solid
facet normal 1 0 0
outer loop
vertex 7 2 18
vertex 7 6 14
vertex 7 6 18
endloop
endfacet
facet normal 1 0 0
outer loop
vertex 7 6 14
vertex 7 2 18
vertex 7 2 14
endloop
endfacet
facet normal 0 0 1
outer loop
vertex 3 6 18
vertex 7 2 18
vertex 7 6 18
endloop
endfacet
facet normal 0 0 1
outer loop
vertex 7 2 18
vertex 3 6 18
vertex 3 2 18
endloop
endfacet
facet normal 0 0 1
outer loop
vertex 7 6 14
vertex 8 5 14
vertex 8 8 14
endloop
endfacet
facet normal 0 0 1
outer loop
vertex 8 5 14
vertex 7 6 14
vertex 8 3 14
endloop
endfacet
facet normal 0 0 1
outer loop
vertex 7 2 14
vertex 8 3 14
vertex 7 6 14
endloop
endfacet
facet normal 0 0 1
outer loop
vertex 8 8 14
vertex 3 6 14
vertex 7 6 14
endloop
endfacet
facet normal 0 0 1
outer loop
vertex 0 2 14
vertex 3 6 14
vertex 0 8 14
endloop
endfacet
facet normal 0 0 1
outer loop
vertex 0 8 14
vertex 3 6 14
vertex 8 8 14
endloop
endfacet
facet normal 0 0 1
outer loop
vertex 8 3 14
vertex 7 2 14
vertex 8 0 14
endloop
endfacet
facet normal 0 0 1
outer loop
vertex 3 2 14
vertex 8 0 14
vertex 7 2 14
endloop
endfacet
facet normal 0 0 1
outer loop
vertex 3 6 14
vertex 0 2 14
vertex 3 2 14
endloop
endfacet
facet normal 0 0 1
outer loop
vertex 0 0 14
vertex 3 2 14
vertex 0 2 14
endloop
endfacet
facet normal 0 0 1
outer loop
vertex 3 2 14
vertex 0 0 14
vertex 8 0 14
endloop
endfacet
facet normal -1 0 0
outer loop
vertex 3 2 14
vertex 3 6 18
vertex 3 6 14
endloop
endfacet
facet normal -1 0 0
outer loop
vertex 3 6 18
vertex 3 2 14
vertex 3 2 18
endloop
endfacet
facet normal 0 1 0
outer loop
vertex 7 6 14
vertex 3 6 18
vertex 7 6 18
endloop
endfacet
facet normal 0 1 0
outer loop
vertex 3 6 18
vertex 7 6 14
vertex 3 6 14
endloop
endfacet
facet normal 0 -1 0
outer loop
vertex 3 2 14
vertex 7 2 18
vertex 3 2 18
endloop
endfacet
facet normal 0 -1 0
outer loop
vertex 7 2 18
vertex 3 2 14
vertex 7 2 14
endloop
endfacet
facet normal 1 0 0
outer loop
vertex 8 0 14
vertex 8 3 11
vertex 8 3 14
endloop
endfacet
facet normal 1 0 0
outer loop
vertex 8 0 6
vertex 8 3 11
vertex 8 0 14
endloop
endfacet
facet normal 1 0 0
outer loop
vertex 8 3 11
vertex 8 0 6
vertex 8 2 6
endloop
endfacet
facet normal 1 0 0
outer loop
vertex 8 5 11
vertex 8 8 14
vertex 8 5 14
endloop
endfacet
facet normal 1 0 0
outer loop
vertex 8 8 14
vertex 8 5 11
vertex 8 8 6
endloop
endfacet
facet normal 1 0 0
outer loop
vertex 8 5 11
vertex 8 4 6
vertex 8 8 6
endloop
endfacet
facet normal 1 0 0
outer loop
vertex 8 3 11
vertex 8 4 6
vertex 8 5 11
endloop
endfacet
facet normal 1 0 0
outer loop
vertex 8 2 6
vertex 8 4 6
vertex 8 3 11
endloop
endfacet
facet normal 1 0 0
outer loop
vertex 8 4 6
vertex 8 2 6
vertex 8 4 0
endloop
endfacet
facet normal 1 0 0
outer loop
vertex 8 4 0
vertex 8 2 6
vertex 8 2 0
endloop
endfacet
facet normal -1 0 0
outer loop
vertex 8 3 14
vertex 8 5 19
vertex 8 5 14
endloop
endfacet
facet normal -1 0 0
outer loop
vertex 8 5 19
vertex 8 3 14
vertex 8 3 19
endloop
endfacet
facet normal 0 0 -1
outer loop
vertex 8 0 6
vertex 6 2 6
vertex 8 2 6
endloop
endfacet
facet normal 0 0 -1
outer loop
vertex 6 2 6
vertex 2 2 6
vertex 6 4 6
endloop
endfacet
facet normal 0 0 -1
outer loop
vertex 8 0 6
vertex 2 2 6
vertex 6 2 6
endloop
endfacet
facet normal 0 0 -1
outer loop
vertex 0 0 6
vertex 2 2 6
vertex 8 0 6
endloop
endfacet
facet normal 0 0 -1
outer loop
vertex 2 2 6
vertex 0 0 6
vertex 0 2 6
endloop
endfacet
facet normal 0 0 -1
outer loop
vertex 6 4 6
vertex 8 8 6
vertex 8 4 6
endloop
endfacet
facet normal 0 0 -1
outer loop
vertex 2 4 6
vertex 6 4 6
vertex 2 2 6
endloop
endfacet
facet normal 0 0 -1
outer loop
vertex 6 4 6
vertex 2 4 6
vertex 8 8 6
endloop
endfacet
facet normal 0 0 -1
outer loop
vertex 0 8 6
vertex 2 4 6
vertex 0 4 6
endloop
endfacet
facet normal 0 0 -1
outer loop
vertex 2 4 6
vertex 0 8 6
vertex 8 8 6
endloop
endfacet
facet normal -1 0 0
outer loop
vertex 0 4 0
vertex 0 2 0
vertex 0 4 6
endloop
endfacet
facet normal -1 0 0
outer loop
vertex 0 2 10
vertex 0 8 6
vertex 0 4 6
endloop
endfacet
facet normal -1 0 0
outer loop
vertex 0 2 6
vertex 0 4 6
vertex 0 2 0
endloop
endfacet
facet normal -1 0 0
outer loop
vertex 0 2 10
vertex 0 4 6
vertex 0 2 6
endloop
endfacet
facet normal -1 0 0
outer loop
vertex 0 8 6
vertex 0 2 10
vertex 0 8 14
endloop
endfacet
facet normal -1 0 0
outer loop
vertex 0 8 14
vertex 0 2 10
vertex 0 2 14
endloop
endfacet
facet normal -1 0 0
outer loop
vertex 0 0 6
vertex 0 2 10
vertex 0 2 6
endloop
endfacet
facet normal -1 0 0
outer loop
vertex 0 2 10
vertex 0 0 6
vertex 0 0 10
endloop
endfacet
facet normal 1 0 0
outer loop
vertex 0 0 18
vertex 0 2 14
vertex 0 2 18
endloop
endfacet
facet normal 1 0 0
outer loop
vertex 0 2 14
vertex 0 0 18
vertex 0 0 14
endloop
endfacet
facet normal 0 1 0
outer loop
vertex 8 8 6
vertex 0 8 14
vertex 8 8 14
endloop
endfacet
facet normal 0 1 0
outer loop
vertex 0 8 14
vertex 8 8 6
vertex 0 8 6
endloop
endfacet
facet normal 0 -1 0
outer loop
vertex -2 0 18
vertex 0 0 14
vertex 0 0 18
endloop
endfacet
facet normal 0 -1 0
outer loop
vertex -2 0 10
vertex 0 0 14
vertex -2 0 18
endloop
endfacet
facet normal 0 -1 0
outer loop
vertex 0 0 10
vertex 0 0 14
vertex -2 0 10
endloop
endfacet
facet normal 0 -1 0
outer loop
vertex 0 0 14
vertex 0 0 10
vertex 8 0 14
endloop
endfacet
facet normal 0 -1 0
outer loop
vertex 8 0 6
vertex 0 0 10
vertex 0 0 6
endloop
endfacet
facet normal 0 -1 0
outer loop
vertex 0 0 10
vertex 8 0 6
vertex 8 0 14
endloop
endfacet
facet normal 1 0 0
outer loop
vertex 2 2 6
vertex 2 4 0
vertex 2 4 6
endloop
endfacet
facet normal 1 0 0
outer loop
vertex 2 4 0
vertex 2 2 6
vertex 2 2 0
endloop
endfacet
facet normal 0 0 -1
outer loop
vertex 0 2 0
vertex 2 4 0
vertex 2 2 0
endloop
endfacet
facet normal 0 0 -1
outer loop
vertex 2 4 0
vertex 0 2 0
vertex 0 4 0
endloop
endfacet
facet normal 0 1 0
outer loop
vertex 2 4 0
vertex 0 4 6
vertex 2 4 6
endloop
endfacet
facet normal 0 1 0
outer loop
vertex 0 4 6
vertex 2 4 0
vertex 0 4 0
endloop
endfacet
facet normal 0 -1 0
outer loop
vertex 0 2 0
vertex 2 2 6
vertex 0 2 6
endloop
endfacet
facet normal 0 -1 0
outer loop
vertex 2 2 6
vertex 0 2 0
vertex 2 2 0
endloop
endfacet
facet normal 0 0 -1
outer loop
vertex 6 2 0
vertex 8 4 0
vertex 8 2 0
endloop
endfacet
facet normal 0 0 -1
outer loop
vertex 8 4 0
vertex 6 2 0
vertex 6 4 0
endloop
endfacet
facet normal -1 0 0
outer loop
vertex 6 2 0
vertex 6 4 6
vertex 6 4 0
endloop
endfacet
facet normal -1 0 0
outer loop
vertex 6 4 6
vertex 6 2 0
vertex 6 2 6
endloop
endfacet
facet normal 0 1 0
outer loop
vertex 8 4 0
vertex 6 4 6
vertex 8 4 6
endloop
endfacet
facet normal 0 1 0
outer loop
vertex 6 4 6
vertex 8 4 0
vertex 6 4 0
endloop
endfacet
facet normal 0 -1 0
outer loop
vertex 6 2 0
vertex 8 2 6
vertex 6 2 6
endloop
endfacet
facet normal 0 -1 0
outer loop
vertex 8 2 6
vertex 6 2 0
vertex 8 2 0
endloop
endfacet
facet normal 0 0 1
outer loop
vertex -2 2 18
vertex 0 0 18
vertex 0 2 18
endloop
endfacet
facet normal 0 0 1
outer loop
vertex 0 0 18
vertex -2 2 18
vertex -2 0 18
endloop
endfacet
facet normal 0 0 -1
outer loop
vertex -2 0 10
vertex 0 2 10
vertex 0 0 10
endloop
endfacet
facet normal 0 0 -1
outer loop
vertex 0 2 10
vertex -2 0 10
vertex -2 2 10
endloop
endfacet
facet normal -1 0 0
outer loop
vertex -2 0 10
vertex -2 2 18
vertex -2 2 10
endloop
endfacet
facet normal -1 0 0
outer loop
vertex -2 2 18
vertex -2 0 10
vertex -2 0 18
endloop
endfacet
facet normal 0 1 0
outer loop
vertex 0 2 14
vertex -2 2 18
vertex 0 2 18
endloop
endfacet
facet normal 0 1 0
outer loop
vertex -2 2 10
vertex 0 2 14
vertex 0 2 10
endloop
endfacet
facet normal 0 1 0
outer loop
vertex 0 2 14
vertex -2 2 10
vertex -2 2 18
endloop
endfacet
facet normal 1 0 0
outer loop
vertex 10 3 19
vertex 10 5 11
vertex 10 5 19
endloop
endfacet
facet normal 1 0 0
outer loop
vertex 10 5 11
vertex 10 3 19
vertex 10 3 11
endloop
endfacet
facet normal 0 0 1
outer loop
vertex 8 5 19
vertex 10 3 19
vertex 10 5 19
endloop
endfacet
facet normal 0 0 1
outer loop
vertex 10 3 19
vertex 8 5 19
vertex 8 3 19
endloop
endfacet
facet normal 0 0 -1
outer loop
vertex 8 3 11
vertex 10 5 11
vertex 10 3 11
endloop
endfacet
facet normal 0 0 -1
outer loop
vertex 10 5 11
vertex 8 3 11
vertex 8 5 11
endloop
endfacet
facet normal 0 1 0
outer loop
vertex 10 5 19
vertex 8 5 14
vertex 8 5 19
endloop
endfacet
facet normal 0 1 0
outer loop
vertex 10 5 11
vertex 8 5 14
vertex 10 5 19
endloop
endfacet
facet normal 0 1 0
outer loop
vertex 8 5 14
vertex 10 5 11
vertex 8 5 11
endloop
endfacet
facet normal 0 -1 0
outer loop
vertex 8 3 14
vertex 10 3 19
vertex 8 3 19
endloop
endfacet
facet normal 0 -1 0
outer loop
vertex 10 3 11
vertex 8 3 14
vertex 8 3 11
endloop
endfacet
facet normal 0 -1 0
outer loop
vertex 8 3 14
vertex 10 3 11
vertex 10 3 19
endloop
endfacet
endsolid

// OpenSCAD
// file: ../../../shapes/minecraft/copper-golem/copper-golem.scad
module copperGolem(headRotation_z = 0,
                    rightArmRotation_x = 0)
{
    // Head
    translate([2, 2, 14])
    {
        color("orange")
        rotate ([0, 0, headRotation_z])
        translate ([1, 0])
        rotate([0, 0, -headRotation_z])
        cube([4, 4, 4], center=false);
    }

    // Body
    translate([0, 0, 6])
    {
        color("green")
        cube([8, 8, 8]);
    }

    // Legs
    translate([0, 2, 0])
    {
        color("pink")
        cube([2, 2, 8]);
    }

    translate([6, 2, 0])
    {
        color("pink")
        cube([2, 2, 8]);
    }

    // Arms
    translate([-2, 0, 10])
    {
        // left arm
        color("red")
        cube([2, 2, 8]);
    }

    translate([8, 3, 11])
    {
        // right arm
        color("red")
        rotate([rightArmRotation_x, 0, 0])
        cube([2, 2, 8]);
    }

    // Eyes
    translate([2, 2, 8])
    {
        color("white")
        cube([2, 2, 2]);
    }

    translate([4, 2, 8])
    {
        color("white")
        cube([2, 2, 2]);
    }
}
// main file
use <../../../shapes/minecraft/copper-golem/copper-golem.scad>

scale = 1 + $t * 0.9;

scale([scale, scale, scale])
//rotate ([0, 0, $t*360])
copperGolem();


// animation settings:
//    FPS: 20
//    Steps: 100
